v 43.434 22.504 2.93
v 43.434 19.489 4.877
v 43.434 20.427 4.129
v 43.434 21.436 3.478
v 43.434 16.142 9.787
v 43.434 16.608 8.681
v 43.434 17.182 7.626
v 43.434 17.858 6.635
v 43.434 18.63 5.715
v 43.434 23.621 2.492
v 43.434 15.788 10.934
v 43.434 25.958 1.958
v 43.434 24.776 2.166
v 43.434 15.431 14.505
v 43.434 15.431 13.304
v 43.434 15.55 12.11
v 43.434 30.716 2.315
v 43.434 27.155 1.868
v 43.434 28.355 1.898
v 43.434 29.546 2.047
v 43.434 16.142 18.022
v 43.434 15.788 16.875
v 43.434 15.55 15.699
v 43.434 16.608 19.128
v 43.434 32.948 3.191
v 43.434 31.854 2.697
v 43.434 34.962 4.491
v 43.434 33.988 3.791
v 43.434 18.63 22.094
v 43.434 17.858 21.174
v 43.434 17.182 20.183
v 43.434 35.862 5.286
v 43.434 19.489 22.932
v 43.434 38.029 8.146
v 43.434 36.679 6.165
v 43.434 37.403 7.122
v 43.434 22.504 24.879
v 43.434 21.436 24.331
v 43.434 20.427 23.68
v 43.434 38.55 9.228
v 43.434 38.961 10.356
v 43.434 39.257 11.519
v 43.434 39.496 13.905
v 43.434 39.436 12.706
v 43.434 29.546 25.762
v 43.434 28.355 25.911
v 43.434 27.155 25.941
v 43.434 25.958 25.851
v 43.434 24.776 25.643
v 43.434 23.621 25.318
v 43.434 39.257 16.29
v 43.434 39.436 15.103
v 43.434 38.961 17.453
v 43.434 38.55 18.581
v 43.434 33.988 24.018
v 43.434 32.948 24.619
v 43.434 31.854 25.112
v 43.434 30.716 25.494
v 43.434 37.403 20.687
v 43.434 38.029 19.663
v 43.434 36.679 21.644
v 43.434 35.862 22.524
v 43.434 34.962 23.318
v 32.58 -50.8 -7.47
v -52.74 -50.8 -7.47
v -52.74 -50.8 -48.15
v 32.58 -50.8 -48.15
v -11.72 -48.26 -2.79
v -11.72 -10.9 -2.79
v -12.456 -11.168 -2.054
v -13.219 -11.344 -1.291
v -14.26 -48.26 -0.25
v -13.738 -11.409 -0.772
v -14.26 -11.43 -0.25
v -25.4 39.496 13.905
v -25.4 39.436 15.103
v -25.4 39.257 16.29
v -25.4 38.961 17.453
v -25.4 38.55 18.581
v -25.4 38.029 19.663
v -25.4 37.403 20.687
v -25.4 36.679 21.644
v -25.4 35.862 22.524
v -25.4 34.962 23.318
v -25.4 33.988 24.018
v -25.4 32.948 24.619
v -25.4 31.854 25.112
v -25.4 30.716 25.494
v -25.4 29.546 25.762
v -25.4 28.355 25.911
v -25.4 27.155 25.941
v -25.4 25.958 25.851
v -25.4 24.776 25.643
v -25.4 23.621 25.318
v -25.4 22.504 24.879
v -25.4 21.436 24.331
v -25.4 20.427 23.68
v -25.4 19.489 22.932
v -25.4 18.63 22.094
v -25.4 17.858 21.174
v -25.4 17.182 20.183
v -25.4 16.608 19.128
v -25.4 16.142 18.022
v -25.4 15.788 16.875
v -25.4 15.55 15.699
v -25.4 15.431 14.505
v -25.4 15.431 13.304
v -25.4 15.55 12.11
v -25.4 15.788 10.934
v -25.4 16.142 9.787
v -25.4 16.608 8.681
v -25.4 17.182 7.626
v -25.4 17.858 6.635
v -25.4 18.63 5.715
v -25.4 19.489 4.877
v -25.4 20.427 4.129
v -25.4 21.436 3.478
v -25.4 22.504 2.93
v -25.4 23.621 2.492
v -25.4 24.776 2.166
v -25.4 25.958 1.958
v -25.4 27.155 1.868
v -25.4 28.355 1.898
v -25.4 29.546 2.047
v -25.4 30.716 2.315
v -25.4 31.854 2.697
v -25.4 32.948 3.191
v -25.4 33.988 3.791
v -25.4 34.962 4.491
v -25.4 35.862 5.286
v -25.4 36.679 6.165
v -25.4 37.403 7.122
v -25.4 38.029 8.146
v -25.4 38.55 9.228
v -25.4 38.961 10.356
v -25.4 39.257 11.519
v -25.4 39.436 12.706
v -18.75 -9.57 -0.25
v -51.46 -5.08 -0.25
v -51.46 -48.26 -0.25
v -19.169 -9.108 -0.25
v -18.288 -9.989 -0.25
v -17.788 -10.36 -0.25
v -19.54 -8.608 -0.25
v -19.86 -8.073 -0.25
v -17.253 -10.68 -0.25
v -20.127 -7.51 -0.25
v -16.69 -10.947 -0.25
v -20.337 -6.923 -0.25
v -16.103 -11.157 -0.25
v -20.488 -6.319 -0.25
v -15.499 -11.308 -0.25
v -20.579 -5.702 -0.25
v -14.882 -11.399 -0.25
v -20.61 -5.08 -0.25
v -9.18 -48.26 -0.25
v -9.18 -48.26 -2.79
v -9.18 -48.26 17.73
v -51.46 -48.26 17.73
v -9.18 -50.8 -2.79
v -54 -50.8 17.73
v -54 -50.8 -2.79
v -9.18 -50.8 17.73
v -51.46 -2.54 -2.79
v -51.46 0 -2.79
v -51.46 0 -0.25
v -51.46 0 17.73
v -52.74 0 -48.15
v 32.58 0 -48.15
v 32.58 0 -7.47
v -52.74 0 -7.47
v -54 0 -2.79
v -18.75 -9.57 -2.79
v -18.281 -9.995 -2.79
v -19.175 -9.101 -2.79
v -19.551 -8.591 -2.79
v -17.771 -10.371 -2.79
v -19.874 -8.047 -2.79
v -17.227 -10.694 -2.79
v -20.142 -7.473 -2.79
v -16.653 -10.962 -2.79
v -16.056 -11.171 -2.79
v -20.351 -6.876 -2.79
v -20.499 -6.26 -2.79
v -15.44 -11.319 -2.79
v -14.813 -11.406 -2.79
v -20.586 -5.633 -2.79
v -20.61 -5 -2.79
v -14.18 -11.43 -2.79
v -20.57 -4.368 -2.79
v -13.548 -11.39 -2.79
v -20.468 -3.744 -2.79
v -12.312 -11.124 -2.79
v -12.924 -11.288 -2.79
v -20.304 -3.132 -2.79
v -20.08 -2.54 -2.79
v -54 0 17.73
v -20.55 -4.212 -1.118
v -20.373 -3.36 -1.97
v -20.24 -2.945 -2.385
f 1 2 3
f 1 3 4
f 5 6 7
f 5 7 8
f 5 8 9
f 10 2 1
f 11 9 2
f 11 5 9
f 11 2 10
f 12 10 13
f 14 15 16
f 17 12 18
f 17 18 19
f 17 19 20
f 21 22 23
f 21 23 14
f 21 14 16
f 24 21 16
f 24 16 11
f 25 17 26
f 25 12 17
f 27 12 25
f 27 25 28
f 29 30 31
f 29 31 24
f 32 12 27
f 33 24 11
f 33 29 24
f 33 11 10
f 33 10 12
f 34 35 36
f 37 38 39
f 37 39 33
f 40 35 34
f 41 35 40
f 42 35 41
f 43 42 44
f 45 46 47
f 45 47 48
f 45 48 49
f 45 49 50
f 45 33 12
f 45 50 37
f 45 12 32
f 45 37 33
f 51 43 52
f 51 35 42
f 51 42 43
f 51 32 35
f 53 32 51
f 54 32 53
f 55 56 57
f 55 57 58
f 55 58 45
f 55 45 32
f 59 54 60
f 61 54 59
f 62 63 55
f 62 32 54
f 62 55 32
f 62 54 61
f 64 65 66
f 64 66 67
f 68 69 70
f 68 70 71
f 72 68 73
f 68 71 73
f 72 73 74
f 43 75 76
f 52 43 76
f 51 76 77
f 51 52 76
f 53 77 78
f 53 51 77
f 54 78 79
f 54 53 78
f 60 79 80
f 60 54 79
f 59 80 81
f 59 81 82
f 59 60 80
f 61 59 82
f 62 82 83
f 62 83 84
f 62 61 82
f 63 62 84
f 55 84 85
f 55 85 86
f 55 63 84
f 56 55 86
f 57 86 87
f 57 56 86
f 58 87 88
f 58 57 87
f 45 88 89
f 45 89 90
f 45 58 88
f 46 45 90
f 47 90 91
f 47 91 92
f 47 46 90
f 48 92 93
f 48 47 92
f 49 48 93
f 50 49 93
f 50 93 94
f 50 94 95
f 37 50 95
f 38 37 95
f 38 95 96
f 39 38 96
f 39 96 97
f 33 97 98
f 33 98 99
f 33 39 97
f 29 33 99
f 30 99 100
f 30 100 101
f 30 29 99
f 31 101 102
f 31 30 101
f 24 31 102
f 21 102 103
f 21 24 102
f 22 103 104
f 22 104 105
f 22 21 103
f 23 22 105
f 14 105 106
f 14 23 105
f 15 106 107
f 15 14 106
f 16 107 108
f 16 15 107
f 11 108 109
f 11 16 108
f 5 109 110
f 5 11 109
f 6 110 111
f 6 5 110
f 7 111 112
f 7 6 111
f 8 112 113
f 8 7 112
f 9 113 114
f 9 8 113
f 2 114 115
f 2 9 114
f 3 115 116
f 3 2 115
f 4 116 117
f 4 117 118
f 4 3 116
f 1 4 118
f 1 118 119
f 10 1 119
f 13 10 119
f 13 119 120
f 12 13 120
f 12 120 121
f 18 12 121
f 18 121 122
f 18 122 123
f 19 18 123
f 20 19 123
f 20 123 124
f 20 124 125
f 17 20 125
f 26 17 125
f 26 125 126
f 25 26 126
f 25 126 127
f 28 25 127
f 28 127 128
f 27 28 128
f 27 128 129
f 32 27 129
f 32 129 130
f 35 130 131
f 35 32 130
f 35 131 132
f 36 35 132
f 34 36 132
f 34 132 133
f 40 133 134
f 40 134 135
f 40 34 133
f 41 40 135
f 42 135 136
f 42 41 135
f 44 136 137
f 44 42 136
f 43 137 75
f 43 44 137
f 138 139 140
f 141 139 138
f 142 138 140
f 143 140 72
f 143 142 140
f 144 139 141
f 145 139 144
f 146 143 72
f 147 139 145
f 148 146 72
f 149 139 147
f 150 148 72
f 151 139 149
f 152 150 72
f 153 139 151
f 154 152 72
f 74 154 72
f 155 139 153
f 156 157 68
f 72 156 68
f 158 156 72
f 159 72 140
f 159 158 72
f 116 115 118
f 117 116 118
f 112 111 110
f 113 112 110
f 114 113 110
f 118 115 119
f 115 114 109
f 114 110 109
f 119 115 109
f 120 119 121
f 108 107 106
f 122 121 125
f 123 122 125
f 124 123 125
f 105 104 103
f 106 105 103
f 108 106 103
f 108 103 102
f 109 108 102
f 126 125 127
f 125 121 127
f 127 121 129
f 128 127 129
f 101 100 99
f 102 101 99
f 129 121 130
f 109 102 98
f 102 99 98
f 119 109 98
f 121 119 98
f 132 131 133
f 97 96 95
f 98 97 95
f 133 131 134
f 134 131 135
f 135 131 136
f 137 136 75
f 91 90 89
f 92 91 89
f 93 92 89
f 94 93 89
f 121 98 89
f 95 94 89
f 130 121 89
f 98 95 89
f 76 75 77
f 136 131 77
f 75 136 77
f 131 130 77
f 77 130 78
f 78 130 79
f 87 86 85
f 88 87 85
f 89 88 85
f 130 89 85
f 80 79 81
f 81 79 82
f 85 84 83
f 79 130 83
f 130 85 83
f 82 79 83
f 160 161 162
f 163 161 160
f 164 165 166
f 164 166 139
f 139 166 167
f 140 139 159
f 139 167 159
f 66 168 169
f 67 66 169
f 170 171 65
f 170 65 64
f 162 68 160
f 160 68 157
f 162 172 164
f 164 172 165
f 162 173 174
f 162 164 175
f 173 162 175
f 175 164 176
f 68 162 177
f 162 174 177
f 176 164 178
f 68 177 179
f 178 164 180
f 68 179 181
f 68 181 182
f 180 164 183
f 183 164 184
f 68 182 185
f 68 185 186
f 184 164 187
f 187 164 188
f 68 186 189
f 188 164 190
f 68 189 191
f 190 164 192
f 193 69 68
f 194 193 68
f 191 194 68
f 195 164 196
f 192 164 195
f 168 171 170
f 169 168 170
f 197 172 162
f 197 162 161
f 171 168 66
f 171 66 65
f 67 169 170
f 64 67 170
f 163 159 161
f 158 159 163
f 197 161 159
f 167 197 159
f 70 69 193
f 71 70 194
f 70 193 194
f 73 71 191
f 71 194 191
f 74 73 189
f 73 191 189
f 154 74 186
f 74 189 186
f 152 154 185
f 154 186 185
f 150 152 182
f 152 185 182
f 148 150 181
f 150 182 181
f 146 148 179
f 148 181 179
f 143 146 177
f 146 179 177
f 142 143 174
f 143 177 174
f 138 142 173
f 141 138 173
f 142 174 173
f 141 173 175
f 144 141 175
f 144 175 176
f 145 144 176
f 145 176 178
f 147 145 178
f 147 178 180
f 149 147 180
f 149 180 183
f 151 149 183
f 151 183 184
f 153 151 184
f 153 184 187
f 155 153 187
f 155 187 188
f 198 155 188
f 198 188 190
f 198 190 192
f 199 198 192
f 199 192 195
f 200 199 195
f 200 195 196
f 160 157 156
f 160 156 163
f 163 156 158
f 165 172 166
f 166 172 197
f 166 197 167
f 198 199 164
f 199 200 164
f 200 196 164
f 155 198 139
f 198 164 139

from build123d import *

# Parameters (mm, degrees)
F0_W          = 85.3199996054
F0_H          = 40.6800028868
F1_DEPTH      = 50.8
F0_W_2        = 44.8200013489
F0_H_2        = 20.5199993216
F2_T          = -2.54
F3_T1_DEPTH   = 55.3441509277
F3_T3_DEPTH   = 61.3241495789
F5_D          = 12.7
F6_R          = 12.039951047
F7_DEPTH      = 43.434
F7_DEPTH_BACK = 25.4


# Not quite as in the source:
# - a fillet or chamfer that OpenCascade refuses, or shapes differently, is made with other operations: its cross-section is extruded or revolved along the edge and cut away or added


with BuildPart() as f1:
    # F0 (on Front) → F1 (new body)
    with BuildSketch(Plane.XZ):
        with Locations((-10.0800003856, -27.810001513)):
            Rectangle(F0_W, F0_H)
    extrude(amount=F1_DEPTH)


with BuildPart() as f1b:
    # F0 (on Front) → F1, piece 2 (new body)
    with BuildSketch(Plane.XZ):
        with Locations((-31.5900007263, 7.4699998368)):
            Rectangle(F0_W_2, F0_H_2)
    extrude(amount=F1_DEPTH)

    # F2
    f2_openings = [f1b.faces().sort_by_distance(p)[0] for p in [
        (-31.590001, -25.4, 17.729999),
        (-31.590001, 0, 7.47),
        (-9.18, -25.4, 7.47),
    ]]
    offset(amount=F2_T, openings=f2_openings)

    # F3: chamfer of 5.08 on 2 edges, made by hand

    # F3_s2 → F3_t1 (cut)
    with BuildSketch(Plane.YZ.offset(-51.4600014007)):
        Polygon((0, -5.329999824), (-5.08, -0.249999824), (0, -0.249999824), align=None)
    extrude(amount=F3_T1_DEPTH, mode=Mode.SUBTRACT)

    # F3_s4 → F3_t3 (cut)
    with BuildSketch(Plane.XZ.offset(-13.0641495789)):
        Polygon((-9.1800000519, -5.329999824), (-14.2600000519, -0.249999824), (-9.1800000519, -0.249999824), align=None)
    extrude(amount=F3_T3_DEPTH, mode=Mode.SUBTRACT)

    # F5 (through all)
    with Locations(Plane.XY.offset(-0.249999824)):
        with Locations((-14.2600000519, -5.08)):
            Hole(F5_D / 2)


with BuildPart() as f7:
    # F6 (on Right) → F7 (new body, two sides)
    with BuildSketch(Plane.YZ) as f7_sk:
        with Locations((27.455566451, 13.9045361429)):
            Circle(F6_R)
    extrude(amount=F7_DEPTH)
    extrude(f7_sk.sketch, amount=-F7_DEPTH_BACK)


solid = Compound([f1.part, f1b.part, f7.part])
